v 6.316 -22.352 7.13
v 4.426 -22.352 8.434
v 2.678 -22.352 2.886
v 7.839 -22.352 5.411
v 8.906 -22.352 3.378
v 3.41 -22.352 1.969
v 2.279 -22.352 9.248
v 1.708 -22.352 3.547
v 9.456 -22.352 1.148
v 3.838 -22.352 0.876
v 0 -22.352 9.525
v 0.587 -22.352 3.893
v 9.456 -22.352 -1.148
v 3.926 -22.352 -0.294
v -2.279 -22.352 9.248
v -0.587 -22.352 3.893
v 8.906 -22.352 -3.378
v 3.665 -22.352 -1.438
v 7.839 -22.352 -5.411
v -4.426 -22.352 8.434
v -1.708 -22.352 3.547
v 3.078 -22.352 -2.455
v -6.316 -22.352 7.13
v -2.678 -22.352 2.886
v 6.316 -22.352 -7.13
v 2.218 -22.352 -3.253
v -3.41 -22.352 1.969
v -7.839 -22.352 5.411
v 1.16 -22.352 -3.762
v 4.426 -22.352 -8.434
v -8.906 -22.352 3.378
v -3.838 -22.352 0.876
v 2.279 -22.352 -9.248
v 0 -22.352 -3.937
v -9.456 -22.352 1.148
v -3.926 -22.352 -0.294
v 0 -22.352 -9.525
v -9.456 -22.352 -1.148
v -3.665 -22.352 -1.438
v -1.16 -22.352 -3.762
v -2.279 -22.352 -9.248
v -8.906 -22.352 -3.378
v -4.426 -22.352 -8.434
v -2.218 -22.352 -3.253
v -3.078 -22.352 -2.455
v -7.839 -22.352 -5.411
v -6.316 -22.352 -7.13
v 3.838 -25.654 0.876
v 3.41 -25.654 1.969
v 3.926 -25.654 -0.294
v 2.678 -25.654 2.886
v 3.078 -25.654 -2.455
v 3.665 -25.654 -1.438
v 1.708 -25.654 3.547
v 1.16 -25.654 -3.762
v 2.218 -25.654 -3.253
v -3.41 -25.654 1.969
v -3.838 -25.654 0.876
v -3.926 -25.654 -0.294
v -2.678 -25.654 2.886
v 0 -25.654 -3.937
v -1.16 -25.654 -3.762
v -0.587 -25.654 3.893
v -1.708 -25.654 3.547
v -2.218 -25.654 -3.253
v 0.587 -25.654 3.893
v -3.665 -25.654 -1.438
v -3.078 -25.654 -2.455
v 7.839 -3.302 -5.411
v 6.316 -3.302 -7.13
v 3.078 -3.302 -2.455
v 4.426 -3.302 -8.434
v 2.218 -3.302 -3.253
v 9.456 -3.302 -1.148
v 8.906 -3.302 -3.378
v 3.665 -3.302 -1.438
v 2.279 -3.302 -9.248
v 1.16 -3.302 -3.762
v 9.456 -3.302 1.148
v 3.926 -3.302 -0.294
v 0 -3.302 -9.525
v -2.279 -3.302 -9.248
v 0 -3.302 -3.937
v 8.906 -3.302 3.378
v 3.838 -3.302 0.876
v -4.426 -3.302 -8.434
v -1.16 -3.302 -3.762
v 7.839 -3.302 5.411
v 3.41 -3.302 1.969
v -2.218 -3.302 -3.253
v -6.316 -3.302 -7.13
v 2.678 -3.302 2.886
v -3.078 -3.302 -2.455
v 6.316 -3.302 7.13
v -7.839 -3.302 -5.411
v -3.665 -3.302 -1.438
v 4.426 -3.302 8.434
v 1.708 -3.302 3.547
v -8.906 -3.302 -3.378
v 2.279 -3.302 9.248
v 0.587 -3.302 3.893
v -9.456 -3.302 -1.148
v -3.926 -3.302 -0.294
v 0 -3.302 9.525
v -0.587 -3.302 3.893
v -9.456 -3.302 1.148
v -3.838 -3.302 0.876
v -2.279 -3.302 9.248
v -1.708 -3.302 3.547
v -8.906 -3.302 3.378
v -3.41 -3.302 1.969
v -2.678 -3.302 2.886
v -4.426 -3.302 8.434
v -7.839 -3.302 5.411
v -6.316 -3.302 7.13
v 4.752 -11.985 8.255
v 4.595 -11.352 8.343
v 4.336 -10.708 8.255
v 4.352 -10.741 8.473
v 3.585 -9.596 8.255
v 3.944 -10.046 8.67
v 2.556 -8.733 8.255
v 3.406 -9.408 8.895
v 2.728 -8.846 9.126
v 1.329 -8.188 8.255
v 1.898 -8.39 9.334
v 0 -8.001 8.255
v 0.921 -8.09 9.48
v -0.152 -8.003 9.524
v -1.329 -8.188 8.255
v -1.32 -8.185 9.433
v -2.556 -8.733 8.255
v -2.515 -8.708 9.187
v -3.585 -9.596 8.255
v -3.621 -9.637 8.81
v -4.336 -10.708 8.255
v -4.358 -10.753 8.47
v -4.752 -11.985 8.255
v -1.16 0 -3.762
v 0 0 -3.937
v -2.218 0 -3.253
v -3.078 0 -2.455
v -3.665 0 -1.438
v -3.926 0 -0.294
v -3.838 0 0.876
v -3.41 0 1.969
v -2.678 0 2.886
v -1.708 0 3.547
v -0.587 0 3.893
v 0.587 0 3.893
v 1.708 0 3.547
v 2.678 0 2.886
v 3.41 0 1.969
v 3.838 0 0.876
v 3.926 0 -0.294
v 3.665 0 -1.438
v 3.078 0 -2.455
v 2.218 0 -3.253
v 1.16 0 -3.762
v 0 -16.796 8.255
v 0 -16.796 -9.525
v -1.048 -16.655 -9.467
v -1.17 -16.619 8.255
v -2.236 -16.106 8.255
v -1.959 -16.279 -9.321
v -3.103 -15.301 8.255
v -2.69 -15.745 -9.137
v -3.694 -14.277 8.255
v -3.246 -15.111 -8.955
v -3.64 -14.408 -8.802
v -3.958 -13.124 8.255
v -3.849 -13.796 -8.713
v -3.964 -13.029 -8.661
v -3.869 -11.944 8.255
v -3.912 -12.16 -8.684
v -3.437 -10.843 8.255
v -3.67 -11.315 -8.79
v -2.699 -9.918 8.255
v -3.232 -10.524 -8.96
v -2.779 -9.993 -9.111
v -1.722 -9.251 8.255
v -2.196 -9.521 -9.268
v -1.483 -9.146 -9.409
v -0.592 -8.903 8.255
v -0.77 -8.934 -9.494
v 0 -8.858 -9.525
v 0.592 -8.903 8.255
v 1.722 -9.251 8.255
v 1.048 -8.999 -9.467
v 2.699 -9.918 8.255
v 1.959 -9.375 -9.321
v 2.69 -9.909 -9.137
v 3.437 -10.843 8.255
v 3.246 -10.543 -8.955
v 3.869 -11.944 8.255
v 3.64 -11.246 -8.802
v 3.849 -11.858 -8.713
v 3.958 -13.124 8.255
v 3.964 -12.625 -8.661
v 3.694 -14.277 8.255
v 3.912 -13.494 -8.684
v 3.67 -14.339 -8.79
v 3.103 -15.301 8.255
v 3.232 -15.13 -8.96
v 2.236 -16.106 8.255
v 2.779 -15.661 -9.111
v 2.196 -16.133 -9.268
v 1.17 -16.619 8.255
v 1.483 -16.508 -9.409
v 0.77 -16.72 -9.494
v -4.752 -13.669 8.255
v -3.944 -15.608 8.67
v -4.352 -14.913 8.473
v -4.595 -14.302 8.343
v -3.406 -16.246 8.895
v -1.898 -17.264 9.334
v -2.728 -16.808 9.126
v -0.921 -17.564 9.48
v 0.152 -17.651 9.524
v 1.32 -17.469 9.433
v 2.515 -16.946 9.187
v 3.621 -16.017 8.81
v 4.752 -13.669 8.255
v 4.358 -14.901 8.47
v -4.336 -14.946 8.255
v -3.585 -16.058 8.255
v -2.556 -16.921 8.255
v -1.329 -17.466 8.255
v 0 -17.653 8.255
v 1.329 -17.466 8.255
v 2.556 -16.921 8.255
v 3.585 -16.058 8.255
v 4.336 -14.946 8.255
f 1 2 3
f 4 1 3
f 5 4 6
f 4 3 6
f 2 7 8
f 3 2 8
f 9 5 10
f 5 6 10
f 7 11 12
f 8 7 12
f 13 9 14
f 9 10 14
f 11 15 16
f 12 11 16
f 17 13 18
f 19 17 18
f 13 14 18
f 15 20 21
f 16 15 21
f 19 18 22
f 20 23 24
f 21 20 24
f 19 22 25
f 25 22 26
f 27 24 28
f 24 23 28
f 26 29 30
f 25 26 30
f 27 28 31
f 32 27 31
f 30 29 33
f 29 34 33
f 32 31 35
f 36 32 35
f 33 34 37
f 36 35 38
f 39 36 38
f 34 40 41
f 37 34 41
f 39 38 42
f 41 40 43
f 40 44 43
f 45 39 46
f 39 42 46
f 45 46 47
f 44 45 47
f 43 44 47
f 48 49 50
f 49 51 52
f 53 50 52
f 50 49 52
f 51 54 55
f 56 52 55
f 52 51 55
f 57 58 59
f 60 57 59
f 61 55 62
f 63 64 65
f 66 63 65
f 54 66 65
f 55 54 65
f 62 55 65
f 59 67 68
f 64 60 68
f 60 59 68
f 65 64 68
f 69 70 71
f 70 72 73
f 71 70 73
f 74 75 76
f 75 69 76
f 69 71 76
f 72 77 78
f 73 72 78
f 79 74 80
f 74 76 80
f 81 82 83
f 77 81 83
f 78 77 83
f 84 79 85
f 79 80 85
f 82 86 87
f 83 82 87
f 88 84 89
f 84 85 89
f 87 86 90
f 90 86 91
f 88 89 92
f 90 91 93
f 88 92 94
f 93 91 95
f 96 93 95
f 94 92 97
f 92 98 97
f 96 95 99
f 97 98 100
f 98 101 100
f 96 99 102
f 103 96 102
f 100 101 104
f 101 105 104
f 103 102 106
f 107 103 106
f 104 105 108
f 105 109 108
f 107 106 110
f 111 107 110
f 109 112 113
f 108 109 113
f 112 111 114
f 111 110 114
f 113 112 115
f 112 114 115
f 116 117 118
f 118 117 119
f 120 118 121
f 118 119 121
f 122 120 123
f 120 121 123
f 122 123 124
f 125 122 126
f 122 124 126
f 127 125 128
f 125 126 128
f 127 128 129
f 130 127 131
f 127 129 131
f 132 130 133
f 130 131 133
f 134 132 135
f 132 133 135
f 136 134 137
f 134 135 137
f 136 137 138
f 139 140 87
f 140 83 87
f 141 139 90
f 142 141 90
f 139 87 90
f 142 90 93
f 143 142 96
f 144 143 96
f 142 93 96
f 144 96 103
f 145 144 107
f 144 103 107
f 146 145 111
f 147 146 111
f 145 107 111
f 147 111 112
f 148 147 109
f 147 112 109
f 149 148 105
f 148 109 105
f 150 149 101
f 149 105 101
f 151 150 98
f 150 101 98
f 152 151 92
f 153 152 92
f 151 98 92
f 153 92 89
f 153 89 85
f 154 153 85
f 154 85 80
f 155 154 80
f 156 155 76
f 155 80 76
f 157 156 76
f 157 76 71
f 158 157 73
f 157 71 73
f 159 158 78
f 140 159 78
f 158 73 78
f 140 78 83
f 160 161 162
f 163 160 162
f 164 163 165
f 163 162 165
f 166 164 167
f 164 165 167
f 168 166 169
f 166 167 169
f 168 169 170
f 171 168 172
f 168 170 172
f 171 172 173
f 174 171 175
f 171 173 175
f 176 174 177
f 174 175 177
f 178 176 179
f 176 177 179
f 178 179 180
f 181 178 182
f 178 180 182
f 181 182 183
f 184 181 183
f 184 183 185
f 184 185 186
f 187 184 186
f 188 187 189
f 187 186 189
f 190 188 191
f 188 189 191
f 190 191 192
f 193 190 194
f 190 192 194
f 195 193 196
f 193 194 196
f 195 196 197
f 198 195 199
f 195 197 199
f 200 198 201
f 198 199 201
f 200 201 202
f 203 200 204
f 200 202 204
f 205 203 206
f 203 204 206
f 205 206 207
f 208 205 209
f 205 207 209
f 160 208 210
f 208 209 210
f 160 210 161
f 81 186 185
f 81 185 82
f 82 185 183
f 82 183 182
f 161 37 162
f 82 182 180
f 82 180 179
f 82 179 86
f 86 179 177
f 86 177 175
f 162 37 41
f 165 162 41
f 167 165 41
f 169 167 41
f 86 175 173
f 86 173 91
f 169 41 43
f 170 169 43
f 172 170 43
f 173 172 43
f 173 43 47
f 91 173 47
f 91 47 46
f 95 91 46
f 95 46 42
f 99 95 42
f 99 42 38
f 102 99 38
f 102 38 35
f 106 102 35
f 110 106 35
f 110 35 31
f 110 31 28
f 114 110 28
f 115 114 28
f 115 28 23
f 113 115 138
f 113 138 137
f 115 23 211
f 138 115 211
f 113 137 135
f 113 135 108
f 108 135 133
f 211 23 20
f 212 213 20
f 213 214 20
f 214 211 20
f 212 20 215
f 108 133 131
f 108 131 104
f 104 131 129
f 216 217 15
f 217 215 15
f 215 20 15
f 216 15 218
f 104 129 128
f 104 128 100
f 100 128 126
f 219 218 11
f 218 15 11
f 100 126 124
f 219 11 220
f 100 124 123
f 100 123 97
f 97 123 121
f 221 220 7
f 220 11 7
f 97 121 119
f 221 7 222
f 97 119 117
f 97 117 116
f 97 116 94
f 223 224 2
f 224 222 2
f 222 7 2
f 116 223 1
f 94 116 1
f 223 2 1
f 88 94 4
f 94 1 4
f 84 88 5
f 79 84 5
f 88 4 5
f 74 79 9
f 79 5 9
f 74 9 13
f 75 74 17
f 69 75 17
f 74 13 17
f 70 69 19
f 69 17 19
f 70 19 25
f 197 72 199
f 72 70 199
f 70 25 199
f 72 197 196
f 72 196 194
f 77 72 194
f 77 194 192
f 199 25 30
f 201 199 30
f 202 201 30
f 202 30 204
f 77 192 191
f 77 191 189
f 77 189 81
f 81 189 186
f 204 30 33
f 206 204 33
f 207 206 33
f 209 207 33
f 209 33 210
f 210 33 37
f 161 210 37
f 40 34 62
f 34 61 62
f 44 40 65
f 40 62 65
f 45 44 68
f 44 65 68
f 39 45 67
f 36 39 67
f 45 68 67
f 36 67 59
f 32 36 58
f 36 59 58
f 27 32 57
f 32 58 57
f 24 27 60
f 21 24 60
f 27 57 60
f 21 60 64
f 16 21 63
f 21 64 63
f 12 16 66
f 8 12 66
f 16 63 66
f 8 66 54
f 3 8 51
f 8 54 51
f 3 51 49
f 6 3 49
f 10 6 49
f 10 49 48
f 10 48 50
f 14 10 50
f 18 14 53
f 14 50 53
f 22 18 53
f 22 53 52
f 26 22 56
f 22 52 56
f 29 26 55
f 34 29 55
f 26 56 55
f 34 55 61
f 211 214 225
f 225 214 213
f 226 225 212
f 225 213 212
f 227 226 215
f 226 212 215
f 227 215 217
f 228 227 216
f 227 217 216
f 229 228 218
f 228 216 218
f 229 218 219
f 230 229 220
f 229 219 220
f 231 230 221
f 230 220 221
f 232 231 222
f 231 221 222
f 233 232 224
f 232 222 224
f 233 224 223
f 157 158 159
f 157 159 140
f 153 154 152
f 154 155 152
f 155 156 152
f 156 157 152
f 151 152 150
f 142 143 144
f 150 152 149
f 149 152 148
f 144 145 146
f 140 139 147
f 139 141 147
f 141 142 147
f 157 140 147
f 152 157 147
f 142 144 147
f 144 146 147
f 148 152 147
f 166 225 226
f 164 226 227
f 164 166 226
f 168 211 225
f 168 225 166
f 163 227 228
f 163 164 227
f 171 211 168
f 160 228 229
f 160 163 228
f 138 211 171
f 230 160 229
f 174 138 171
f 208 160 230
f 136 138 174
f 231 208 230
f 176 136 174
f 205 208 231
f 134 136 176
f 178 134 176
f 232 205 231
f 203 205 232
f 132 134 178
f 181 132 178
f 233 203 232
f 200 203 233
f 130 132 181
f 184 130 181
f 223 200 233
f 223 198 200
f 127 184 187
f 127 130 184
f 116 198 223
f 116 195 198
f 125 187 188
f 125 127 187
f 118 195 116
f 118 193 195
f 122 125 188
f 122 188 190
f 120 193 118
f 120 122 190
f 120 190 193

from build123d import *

# Parameters (mm, degrees)
SKETCH9_R                        = 4.826
CUT_EXTRUDE1_DEPTH               = 1.27
SKETCH10_W                       = 3.96875
SKETCH10_H                       = 17.78
F_3_8_16_TAPPED_HOLE2_AT_2_COUNT = 2
F_3_8_16_TAPPED_HOLE2_AT_2_PITCH = 29.889478418


with BuildPart() as part:
    # Sketch4 → Revolve1 (revolve)
    with BuildSketch(Plane.XY, mode=Mode.PRIVATE) as revolve1_sk:
        Polygon((0, 0), (3.937, 0), (3.937, -3.302), (9.525, -3.302), (9.525, -22.352), (3.937, -22.352), (3.937, -25.654), (0, -25.654), align=None)
    revolve(revolve1_sk.sketch.rotate(Axis((0, -25.654, 0), (0, 1, 0)), 90), axis=Axis((0, -25.654, 0), (0, 1, 0)))

    # Sketch9 → Cut-Extrude1 (cut)
    with BuildSketch(Plane.XY.offset(9.525)):
        with Locations((0, -12.827)):
            Circle(SKETCH9_R)
    extrude(amount=-CUT_EXTRUDE1_DEPTH, mode=Mode.SUBTRACT)

    # Sketch10 → 3/8-16 Tapped Hole2 (revolve, cut)
    with BuildSketch(Plane(origin=(0, -12.827, 8.255), x_dir=(0, -1, 0), z_dir=(1, 0, 0))):
        with Locations((1.984375, 8.89)):
            Rectangle(SKETCH10_W, SKETCH10_H)
    f_3_8_16_tapped_hole2 = revolve(axis=Axis((0, -12.827, 14.605), (0, 0, -1)), mode=Mode.SUBTRACT)

    # 3/8-16 Tapped Hole2 at 2: 3/8-16 Tapped Hole2 ×2
    with Locations(*[Vector(0.9929520890622513, 0.11851644960473202, 0) * (i * F_3_8_16_TAPPED_HOLE2_AT_2_PITCH) for i in range(1, F_3_8_16_TAPPED_HOLE2_AT_2_COUNT)]):
        add(f_3_8_16_tapped_hole2, mode=Mode.SUBTRACT)


solid = part.part
